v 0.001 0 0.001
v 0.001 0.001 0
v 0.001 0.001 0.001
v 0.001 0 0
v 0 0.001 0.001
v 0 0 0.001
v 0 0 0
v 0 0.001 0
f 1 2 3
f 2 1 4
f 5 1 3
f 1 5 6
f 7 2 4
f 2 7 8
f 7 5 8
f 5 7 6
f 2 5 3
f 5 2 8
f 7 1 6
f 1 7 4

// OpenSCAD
u=[[0,0,0],[1,0,0],[1,1,0],[0,1,0],[0,0,1],[1,0,1],[1,1,1],[0,1,1]];
l=[for(i=u)round(rands(0,10,1)[0])>5?mutate(i):i];

call=collapsedEdges(l);
call2=collapsedCross(l);
call3= eq2avrg(l);

echo(call,call2 ,call3 ,
call>=7?"by 1 invalid":"",
odd(call2+call+1)?"by 2 invalid":"",
abs(call3)<=1?"by 3 invalid":"");

function flatten(v)=[for(n=v)for( nn=n)nn];
    

union()
{polyhedron(
l,

[[0,1,2],[0,2,3],[4,6,5],[4,7,6],
    [0,4,5],[1,0,5],[1,5,6],[2,1,6],
    [2,6,7],[2,7,3],[3,7,4],[0,3,4]]);
cube(.001);
}
//    0123
//    4567

function mutate(p)=[0.5,.5,0.5];
function odd(n)=n%2>=1;
 
// doesn not do whats intended
function eq2avrg(l)=   ones(3)*(ones(8)*([for([1:8])l[0]]-l));
function collapsedEdges(l)=let(eds=EDGES())(ones(len(eds))*[for(ed=eds)l[ed[0]]==l[ed[1]]? 1:0])
    ;
 function collapsedCross(l)=    
 (l[0]==l[6]?0:1)+
 (l[1]==l[7]?0:1)+
 (l[2]==l[4]?0:1)+    
 (l[3]==l[5]?0:1)+ 
(
(((l[0]==l[2])==(l[1]==l[3]))&&
((l[4]==l[6])==(l[5]==l[7])))&&
 
(((l[0]==l[5])==(l[1]==l[4]))&&
((l[2]==l[7])==(l[3]==l[6])))&&
 
(
((l[3]==l[4])==(l[0]==l[7]))&&
((l[1]==l[6])==(l[2]==l[5])))?0:1 )
;
function EDGES() = [
    [0,1],    [1,2],    [2,3],
    [3,0],    [4,5],    [5,6],
    [6,7],    [7,4],    [0,4],
    [1,5],    [2,6],    [3,7]  ];
function ones(l)=[for([1:l])1];
